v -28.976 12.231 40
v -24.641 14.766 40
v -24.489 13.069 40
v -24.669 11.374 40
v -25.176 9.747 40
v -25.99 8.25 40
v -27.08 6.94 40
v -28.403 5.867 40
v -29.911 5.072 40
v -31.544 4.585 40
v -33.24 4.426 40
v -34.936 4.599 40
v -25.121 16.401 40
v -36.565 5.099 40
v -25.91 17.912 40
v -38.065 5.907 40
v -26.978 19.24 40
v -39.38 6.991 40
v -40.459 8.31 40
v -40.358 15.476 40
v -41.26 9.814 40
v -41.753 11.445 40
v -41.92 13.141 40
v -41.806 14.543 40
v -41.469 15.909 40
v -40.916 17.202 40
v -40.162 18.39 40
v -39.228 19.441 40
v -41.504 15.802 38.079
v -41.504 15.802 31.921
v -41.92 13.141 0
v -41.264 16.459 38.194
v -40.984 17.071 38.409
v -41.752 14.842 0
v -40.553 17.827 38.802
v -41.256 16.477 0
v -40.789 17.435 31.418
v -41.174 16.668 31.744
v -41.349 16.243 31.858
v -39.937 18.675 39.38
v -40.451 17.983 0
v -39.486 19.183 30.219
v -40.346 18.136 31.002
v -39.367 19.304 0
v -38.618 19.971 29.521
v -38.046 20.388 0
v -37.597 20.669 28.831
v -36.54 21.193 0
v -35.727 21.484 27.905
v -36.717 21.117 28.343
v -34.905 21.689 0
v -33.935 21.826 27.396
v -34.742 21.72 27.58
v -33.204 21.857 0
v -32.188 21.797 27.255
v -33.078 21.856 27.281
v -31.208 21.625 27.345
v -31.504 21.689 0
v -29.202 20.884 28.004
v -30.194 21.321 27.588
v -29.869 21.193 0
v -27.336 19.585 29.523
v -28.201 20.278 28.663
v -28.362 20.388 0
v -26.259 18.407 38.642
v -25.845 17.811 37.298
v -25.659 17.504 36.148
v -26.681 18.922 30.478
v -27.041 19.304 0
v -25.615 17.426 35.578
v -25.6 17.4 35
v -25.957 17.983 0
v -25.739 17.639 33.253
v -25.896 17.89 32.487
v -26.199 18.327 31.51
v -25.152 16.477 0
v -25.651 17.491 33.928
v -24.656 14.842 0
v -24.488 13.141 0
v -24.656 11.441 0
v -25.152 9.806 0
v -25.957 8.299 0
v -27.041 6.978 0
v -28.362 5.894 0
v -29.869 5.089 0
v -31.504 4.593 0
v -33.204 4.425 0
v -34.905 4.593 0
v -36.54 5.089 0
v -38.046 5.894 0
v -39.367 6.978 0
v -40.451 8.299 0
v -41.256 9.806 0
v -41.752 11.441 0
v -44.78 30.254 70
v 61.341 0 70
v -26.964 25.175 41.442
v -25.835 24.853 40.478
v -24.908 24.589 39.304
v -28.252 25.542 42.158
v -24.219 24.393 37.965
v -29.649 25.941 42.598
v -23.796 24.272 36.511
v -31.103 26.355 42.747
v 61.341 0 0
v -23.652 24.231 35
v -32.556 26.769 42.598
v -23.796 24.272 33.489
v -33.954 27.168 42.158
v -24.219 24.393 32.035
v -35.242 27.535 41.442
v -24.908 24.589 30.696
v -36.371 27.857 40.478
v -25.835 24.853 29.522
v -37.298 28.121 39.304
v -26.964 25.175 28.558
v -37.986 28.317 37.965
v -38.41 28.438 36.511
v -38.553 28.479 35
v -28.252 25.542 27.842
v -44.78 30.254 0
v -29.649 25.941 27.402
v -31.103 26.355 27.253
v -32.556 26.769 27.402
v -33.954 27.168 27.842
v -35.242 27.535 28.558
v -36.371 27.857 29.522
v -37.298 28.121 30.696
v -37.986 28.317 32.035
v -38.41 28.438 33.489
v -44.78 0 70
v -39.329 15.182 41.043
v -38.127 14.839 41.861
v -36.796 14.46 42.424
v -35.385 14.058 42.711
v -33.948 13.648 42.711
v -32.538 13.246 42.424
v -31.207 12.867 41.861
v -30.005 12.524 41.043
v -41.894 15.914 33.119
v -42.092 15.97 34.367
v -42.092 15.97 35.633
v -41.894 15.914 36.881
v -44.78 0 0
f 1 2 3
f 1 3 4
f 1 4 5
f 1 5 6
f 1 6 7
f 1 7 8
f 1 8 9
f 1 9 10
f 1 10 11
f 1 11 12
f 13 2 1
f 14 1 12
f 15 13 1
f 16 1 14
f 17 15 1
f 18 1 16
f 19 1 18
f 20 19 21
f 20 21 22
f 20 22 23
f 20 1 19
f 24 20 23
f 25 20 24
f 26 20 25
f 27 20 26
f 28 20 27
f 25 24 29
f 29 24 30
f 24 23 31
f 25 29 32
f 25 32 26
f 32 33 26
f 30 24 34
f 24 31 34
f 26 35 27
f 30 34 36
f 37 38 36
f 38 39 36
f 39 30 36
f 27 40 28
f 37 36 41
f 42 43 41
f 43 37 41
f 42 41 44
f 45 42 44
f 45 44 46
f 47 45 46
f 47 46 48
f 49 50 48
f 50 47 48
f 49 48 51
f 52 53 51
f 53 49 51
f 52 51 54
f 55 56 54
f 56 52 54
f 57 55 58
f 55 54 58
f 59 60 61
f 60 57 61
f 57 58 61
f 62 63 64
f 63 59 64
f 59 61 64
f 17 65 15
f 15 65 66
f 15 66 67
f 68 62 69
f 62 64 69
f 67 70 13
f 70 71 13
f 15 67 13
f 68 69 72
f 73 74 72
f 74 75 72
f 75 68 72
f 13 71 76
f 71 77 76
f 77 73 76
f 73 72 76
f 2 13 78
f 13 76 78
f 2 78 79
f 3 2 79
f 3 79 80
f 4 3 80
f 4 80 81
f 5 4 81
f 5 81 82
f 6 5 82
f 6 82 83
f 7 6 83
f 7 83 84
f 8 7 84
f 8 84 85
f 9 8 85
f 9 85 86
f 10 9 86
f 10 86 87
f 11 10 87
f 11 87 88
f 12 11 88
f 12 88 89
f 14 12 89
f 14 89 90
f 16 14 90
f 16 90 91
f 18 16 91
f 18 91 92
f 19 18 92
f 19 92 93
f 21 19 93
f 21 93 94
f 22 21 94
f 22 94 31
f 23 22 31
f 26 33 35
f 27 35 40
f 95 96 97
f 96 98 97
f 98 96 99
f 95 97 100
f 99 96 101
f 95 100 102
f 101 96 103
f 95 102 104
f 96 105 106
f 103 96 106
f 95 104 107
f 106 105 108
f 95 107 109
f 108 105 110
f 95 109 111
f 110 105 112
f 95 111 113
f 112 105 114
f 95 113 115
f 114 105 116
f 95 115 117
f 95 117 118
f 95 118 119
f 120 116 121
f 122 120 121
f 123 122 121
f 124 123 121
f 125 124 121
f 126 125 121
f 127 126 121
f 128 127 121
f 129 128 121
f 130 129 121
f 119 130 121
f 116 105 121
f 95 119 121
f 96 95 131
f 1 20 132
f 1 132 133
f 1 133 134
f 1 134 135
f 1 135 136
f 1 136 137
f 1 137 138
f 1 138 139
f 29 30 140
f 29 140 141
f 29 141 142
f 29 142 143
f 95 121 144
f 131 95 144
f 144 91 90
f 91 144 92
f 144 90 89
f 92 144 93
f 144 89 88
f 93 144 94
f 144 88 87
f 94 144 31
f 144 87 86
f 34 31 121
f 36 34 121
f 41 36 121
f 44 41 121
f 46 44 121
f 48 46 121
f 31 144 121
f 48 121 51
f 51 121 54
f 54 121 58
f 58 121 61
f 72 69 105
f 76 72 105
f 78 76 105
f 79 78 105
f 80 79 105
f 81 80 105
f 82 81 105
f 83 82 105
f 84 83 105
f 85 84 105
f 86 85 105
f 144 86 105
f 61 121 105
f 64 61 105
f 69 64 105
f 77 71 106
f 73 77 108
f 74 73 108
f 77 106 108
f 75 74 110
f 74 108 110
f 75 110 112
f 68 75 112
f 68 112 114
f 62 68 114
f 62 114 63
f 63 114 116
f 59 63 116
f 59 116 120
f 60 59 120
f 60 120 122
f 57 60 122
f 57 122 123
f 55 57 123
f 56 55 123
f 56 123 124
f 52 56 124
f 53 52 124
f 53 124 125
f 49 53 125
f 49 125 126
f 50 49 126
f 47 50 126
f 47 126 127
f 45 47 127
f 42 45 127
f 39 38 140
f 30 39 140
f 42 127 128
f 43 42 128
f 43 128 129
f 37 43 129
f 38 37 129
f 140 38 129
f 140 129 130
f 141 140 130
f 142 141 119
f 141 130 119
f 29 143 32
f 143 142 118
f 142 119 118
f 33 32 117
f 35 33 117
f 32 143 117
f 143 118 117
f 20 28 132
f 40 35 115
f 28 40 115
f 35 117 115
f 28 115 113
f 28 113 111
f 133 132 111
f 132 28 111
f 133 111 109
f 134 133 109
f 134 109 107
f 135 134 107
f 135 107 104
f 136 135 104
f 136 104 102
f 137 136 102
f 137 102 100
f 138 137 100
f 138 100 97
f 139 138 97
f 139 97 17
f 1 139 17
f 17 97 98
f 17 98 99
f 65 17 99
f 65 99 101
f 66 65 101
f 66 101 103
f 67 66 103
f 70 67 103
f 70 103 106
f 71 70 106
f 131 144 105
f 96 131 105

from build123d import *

# Parameters (mm, degrees)
BOSS_EXTRUDE1_DEPTH = 70
SKETCH4_R           = 7.747265665
CUT_EXTRUDE1_DEPTH  = 13
SKETCH7_R           = 8.715693707
CUT_EXTRUDE2_DEPTH  = 40


with BuildPart() as part:
    # Sketch1 → Boss-Extrude1 (new body)
    with BuildSketch(Plane.XY):
        Polygon((-44.780066958, 0), (61.341290068, 0), (-44.780066958, 30.254301436), align=None)
    extrude(amount=BOSS_EXTRUDE1_DEPTH)

    # Sketch4 → Cut-Extrude1 (cut)
    with BuildSketch(Plane(origin=(4.610887587, 16.173357987, 0), x_dir=(0.961681983, -0.274167401, 0), z_dir=(0.274167401, 0.961681983, 0))):
        with Locations((-37.136646247, -35)):
            Circle(SKETCH4_R)
    extrude(amount=-CUT_EXTRUDE1_DEPTH, mode=Mode.SUBTRACT)

    # Sketch7 → Cut-Extrude2 (cut)
    with BuildSketch(Plane(origin=(0, 0, 0), x_dir=(-1, 0, 0), z_dir=(0, 0, -1))):
        with Locations((33.204170233, 13.141177122)):
            Circle(SKETCH7_R)
    extrude(amount=-CUT_EXTRUDE2_DEPTH, mode=Mode.SUBTRACT)


solid = part.part
